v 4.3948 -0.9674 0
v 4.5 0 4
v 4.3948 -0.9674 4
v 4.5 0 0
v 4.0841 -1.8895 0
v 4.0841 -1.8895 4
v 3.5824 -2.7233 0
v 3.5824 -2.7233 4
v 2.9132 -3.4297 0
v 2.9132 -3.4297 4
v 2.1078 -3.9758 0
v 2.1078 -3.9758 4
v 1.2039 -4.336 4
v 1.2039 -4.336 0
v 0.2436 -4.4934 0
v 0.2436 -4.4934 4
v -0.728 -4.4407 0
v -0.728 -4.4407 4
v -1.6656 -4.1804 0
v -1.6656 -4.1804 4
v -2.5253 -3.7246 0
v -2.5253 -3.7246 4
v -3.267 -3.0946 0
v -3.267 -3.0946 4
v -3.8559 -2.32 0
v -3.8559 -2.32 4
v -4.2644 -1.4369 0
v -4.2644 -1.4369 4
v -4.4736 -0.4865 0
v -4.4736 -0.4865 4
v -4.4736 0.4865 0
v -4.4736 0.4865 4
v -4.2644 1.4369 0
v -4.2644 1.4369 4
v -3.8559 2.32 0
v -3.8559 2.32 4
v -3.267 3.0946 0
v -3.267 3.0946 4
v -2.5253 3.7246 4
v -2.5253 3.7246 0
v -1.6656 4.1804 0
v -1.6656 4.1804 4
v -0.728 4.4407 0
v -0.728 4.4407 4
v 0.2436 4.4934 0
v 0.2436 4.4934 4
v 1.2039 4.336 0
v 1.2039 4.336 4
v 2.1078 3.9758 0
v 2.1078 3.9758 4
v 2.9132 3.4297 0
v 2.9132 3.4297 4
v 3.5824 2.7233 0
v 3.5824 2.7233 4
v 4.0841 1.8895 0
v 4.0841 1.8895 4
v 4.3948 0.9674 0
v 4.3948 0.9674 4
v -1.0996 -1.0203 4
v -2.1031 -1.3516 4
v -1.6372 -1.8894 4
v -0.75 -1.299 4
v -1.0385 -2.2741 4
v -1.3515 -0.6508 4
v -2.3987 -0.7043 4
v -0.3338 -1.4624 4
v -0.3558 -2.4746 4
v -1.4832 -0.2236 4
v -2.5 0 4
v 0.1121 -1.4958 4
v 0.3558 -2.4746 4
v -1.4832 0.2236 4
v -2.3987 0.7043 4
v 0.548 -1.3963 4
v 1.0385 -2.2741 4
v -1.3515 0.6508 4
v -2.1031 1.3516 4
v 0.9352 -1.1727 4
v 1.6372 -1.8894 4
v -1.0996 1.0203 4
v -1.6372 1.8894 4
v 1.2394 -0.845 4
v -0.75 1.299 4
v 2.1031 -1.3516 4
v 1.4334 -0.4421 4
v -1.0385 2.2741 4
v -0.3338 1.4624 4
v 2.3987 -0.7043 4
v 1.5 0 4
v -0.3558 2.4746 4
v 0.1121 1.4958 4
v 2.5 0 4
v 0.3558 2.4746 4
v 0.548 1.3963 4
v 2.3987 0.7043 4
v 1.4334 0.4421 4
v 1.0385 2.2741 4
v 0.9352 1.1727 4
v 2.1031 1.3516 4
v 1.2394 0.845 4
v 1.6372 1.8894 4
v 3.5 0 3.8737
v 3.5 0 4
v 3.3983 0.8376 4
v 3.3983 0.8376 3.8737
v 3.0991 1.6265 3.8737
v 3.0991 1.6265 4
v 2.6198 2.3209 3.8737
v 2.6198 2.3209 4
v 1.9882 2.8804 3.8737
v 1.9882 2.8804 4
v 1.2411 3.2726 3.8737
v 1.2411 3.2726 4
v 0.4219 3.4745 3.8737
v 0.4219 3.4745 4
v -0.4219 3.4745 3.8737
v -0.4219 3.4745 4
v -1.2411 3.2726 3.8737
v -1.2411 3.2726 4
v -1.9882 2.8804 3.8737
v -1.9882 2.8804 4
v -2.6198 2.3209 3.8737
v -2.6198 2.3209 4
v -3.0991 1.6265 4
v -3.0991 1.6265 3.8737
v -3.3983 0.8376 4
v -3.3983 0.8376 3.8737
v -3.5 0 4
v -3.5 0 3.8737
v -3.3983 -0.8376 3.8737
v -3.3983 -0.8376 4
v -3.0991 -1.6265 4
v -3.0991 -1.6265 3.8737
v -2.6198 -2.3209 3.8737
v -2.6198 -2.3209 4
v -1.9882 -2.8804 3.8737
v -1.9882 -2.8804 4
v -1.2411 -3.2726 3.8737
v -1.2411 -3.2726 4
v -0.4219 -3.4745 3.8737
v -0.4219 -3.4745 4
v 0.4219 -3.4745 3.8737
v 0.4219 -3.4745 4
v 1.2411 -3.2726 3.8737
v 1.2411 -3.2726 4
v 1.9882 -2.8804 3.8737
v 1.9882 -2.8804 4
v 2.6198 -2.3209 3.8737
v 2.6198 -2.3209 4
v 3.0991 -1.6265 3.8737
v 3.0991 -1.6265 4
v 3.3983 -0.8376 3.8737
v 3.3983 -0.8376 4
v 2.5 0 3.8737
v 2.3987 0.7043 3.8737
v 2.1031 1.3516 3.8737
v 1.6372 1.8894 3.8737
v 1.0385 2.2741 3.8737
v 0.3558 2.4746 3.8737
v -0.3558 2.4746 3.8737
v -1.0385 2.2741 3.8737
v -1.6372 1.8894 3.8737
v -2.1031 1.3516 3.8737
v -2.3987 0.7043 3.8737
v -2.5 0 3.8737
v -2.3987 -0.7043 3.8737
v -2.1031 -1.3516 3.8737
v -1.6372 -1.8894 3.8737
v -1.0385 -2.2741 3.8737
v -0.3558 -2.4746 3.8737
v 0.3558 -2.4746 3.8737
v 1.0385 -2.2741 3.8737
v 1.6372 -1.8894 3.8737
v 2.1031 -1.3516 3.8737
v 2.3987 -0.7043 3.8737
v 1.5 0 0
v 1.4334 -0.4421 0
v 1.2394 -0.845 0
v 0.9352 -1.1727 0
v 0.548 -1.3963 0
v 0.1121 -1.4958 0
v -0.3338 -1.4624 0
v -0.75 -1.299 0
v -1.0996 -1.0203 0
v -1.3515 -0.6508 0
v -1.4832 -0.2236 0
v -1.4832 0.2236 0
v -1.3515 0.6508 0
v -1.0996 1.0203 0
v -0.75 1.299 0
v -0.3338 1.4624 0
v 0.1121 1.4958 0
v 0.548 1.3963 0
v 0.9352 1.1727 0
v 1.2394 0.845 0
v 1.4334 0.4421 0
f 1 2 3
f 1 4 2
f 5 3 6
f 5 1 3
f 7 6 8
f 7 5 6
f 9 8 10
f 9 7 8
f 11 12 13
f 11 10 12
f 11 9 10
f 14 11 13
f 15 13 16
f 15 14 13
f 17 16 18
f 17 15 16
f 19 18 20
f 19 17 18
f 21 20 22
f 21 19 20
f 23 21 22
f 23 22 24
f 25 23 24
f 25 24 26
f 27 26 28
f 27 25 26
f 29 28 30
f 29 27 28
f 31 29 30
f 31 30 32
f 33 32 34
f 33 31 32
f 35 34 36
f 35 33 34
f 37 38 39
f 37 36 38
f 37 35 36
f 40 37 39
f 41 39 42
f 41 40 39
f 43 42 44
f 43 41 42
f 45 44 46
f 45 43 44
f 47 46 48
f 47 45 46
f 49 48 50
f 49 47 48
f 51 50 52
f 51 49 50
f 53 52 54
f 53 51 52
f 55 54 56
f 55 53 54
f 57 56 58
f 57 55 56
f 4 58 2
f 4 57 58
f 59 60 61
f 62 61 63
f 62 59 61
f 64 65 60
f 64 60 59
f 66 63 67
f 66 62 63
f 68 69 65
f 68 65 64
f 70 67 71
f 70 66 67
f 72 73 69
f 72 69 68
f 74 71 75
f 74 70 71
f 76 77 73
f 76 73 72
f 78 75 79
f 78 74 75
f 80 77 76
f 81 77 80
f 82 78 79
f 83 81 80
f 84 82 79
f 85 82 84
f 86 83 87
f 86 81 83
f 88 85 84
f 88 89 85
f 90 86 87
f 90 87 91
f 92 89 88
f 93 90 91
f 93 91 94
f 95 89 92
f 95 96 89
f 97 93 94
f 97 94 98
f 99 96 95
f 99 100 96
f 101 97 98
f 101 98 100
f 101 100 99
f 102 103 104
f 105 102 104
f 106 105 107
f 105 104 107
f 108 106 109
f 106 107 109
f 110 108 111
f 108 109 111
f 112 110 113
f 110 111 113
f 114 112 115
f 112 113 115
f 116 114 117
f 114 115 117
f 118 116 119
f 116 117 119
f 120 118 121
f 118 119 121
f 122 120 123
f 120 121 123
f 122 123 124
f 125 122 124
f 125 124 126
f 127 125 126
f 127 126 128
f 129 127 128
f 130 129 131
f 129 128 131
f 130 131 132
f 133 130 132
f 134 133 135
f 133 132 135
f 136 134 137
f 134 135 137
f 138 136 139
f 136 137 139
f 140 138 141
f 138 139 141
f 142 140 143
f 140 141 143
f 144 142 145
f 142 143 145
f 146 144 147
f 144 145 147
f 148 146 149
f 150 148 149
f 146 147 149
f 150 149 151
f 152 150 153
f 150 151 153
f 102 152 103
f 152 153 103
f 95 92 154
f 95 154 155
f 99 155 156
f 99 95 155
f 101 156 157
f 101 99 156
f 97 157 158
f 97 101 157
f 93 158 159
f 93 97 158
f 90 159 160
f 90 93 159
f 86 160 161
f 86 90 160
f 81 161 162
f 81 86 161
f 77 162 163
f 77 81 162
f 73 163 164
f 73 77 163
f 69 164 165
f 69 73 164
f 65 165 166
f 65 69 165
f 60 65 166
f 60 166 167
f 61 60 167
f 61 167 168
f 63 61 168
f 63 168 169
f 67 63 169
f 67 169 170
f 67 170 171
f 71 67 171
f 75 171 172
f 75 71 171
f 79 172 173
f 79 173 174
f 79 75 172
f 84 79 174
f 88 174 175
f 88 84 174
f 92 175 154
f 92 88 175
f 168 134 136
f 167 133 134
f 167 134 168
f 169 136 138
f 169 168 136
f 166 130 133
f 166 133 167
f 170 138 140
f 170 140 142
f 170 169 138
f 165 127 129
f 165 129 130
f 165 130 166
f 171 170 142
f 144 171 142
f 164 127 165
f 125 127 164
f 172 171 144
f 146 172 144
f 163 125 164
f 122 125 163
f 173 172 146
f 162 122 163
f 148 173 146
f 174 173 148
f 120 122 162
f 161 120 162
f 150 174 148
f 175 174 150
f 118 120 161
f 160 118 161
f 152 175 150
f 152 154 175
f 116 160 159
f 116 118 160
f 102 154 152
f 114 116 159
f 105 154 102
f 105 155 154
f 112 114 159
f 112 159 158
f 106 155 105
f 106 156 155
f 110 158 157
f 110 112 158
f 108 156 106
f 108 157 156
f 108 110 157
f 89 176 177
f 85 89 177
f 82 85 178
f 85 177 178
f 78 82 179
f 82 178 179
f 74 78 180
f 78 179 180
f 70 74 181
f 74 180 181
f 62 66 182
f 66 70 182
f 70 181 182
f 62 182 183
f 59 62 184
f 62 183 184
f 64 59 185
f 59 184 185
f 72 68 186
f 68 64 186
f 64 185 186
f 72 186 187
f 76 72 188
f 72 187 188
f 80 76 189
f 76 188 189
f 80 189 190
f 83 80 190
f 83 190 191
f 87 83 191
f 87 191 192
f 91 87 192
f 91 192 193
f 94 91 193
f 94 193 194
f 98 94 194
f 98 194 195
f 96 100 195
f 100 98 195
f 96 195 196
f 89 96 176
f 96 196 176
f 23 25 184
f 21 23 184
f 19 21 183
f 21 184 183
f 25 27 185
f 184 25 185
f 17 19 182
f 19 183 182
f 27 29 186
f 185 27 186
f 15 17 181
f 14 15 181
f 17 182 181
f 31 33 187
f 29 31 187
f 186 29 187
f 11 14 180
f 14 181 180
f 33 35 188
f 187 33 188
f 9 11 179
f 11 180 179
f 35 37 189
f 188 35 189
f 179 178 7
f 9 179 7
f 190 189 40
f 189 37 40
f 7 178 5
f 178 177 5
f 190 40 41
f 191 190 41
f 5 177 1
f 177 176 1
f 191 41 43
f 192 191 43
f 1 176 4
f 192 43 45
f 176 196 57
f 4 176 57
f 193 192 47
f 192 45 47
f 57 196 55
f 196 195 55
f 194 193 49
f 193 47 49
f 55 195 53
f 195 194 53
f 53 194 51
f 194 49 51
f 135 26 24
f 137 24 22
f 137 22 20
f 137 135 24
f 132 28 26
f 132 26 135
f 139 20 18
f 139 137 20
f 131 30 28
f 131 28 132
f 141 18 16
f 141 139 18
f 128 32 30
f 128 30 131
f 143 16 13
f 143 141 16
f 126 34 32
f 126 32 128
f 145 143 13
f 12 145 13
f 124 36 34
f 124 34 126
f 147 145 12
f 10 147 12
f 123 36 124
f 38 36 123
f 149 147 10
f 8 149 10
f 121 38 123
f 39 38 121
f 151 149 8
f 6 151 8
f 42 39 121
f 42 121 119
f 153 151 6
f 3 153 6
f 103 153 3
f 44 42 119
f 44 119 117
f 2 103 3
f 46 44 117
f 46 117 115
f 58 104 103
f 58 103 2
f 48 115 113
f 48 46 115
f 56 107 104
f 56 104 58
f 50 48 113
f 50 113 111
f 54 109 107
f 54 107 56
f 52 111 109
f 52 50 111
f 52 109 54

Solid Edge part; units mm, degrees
sketch "Sketch1" plane through (0, 0, 0) normal (0, 0, 1) x (1, 0, 0)
  circle A0 centre (0, 0) radius 4.5
  circle A1 centre (0, 0) radius 1.5
extrude "Protrusion1" add sketch "Sketch1" along normal blind 4
sketch "Sketch2" plane through (0, 0, 4) normal (0, 0, 1) x (1, 0, 0)
  circle A0 centre (0, 0) radius 2.5
  circle A1 centre (0, 0) radius 3.5
extrude "ExtrudedCutout_1" cut sketch "Sketch2" along normal mid plane 0.2526
